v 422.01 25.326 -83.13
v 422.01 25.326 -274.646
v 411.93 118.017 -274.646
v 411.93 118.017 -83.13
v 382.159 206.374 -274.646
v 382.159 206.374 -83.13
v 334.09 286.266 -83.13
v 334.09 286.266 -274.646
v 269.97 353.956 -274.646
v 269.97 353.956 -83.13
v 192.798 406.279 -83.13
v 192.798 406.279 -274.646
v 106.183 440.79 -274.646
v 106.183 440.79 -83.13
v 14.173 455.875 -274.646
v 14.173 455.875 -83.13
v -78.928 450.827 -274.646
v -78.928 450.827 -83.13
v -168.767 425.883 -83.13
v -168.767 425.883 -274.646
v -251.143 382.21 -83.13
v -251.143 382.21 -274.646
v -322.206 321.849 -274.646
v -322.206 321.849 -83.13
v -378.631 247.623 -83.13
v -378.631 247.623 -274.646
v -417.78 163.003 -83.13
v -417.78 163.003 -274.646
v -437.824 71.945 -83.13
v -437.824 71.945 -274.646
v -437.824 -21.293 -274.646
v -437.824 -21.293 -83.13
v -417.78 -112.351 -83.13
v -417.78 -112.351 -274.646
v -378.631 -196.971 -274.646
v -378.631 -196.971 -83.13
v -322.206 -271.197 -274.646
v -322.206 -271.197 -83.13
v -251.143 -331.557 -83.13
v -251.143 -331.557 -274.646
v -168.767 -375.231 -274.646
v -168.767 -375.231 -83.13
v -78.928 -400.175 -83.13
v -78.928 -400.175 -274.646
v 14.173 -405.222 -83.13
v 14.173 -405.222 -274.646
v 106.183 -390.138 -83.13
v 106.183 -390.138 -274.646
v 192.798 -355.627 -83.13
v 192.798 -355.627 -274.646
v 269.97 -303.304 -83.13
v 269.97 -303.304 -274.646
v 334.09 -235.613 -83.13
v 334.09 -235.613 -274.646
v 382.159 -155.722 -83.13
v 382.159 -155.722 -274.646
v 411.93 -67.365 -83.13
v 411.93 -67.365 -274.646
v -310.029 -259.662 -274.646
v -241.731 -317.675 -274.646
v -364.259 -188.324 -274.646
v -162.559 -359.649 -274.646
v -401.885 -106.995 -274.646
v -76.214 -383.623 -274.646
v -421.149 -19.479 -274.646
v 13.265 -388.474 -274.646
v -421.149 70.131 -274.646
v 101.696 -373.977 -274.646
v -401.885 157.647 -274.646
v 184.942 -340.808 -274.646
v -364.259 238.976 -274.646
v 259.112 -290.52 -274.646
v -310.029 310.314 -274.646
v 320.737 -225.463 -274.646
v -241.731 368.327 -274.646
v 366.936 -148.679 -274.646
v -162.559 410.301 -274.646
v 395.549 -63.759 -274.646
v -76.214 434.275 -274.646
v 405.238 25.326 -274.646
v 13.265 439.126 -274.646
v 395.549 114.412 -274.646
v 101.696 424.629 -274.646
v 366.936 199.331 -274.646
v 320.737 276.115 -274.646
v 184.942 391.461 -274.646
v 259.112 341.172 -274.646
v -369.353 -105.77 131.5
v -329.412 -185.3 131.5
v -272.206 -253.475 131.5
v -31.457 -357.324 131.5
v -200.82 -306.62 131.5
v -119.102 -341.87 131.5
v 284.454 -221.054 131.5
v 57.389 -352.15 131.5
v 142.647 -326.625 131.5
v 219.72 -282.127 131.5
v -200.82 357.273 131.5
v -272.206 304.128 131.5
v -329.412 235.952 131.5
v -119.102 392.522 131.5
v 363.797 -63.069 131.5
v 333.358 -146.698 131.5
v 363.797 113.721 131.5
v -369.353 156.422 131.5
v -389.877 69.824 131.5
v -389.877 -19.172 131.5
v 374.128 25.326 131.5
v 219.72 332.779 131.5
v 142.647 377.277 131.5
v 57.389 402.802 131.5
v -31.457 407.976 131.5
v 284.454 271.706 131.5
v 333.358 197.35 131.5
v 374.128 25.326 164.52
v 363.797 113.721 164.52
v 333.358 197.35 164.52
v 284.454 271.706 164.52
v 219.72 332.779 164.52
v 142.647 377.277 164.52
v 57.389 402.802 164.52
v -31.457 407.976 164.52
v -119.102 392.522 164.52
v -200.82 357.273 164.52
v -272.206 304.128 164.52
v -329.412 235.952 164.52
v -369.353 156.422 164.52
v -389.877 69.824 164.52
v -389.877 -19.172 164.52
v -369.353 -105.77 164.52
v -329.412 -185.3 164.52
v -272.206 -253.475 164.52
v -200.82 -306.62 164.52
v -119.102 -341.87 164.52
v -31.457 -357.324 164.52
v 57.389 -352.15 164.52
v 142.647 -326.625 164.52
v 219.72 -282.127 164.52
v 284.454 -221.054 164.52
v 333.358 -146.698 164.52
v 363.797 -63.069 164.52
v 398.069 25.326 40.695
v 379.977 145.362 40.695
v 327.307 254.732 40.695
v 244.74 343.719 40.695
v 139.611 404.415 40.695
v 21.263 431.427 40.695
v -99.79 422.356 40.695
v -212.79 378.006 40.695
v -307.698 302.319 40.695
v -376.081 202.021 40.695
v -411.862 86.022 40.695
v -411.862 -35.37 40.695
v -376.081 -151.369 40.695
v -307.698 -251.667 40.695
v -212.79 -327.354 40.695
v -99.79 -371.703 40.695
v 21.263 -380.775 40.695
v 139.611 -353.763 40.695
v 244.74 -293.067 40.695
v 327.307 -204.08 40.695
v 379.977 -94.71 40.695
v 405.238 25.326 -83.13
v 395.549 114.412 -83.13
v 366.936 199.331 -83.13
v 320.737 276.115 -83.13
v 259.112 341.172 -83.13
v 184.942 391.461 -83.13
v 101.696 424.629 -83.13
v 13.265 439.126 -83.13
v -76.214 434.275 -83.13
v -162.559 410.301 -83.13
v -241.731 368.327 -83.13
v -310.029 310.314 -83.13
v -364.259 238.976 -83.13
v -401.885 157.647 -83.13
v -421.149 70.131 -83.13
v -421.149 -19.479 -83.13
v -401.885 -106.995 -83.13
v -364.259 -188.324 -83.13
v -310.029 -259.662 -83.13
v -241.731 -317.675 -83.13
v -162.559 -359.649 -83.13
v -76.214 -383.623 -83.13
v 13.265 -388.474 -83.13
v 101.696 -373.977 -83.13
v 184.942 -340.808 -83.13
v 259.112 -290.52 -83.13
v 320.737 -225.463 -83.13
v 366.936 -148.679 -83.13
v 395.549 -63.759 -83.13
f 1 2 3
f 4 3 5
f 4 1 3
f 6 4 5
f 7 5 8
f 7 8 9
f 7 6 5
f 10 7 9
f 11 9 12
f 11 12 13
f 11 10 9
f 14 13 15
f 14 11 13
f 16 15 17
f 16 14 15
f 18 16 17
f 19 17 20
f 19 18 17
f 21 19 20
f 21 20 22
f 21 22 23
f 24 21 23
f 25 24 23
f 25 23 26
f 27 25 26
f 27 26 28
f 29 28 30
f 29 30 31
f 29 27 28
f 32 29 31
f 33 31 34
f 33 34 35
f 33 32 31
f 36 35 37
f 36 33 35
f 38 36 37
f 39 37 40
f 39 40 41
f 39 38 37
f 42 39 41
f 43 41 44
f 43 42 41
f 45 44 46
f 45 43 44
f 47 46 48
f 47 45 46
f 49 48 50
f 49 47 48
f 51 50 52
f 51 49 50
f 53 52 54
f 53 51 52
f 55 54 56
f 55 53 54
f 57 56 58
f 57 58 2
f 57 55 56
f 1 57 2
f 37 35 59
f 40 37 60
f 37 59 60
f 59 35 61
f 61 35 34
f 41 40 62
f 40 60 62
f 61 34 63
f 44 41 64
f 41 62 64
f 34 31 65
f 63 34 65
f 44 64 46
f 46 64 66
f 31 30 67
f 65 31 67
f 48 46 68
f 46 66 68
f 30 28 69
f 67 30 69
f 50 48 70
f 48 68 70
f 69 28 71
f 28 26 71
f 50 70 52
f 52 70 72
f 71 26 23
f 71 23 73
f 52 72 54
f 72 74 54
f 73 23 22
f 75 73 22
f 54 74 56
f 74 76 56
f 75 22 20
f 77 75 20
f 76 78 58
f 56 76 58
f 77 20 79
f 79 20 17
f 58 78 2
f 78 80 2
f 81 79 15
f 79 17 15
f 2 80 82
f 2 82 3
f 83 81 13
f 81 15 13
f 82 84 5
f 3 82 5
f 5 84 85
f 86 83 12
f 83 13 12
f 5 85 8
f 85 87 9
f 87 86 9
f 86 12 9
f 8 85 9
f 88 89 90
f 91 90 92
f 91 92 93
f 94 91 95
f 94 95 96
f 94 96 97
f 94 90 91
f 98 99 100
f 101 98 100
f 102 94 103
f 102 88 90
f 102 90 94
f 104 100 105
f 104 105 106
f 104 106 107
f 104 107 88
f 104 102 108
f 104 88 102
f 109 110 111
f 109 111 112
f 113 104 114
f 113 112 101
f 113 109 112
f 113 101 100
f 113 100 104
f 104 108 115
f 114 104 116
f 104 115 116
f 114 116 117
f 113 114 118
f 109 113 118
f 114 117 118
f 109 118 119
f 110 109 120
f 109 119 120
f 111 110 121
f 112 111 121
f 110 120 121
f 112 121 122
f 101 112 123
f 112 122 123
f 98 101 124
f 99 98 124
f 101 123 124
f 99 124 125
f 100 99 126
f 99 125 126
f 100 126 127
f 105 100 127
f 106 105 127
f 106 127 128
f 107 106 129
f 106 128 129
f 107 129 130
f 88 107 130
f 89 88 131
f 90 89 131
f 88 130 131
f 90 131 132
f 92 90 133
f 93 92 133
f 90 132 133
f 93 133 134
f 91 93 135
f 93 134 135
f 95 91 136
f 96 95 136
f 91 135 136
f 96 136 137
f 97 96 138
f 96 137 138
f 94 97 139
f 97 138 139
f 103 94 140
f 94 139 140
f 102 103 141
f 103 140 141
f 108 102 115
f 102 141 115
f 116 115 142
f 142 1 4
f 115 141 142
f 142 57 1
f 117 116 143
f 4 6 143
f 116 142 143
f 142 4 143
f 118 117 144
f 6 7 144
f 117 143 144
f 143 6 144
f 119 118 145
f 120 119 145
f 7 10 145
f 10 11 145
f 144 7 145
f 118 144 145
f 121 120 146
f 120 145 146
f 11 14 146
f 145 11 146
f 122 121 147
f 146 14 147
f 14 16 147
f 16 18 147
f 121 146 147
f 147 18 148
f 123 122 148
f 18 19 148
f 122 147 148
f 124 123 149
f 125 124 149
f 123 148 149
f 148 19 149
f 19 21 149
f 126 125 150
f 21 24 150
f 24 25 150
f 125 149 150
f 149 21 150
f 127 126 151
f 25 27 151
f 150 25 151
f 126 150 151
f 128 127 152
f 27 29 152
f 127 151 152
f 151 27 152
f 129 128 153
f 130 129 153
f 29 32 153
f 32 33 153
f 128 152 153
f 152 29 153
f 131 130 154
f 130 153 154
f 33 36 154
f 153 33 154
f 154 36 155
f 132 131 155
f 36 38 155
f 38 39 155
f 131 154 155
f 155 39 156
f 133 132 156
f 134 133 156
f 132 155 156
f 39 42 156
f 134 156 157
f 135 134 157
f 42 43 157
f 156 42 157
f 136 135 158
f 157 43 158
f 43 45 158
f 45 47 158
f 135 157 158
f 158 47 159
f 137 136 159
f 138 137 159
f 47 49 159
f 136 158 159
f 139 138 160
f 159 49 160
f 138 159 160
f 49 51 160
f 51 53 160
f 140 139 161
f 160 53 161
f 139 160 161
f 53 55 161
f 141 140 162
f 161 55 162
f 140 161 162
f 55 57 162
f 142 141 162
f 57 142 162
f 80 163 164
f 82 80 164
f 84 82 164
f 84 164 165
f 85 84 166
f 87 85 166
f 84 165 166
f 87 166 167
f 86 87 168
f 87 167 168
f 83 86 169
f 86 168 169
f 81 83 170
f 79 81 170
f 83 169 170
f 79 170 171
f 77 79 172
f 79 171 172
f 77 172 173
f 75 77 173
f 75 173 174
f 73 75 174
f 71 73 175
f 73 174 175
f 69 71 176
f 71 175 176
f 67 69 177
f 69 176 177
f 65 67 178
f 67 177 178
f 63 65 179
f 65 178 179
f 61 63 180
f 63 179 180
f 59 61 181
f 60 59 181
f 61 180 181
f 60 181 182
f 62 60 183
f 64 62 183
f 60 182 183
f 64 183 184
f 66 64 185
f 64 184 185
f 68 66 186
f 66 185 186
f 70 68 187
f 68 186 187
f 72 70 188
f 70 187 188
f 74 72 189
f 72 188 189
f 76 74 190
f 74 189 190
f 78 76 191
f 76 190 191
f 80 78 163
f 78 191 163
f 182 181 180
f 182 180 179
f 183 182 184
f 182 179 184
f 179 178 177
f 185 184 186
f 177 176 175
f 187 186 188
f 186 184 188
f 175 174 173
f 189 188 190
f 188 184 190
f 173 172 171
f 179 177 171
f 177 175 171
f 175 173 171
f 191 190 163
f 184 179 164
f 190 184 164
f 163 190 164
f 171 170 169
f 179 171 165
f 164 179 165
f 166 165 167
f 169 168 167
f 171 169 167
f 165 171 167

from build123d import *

# Parameters (mm, degrees)
SKETCH1_R           = 33.167751503
SKETCH1_R_2         = 31.877533848
BOSS_EXTRUDE1_DEPTH = 14.732
SKETCH4_R           = 29.484523805
SKETCH1_3_R         = 33.167751503
SKETCH5_R           = 29.484523805
CUT_EXTRUDE1_DEPTH  = 2.54
SCALE1_SCALE        = 13


with BuildPart() as part:
    # Sketch1 → Boss-Extrude1 (new body)
    with BuildSketch(Plane.XY):
        with Locations((-9.170341316, 25.326095841)):
            Circle(SKETCH1_R)
        with Locations((-9.170341316, 25.326095841)):
            Circle(SKETCH1_R_2, mode=Mode.SUBTRACT)
    extrude(amount=-BOSS_EXTRUDE1_DEPTH)

    # Sketch4 → Loft1 section 0
    with BuildSketch(Plane.XY.offset(19.05)):
        with Locations((-9.170341316, 25.326095841)):
            Circle(SKETCH4_R)
    # Sketch1<3> → Loft1 section 1
    with BuildSketch(Plane.XY):
        with Locations((-9.170341316, 25.326095841)):
            Circle(SKETCH1_3_R)
    loft()

    # Sketch5 → Cut-Extrude1 (cut)
    with BuildSketch(Plane.XY.offset(19.05)):
        with Locations((-9.170341316, 25.326095841)):
            Circle(SKETCH5_R)
    extrude(amount=-CUT_EXTRUDE1_DEPTH, mode=Mode.SUBTRACT)


with BuildPart() as part_1:
    # Scale1: scaled about (-9.170341316, 25.326095841, 6.927517959)
    add(part.part.scale(SCALE1_SCALE).moved(Location((110.044095792, -303.913150092, -83.130215508))))


solid = part_1.part
